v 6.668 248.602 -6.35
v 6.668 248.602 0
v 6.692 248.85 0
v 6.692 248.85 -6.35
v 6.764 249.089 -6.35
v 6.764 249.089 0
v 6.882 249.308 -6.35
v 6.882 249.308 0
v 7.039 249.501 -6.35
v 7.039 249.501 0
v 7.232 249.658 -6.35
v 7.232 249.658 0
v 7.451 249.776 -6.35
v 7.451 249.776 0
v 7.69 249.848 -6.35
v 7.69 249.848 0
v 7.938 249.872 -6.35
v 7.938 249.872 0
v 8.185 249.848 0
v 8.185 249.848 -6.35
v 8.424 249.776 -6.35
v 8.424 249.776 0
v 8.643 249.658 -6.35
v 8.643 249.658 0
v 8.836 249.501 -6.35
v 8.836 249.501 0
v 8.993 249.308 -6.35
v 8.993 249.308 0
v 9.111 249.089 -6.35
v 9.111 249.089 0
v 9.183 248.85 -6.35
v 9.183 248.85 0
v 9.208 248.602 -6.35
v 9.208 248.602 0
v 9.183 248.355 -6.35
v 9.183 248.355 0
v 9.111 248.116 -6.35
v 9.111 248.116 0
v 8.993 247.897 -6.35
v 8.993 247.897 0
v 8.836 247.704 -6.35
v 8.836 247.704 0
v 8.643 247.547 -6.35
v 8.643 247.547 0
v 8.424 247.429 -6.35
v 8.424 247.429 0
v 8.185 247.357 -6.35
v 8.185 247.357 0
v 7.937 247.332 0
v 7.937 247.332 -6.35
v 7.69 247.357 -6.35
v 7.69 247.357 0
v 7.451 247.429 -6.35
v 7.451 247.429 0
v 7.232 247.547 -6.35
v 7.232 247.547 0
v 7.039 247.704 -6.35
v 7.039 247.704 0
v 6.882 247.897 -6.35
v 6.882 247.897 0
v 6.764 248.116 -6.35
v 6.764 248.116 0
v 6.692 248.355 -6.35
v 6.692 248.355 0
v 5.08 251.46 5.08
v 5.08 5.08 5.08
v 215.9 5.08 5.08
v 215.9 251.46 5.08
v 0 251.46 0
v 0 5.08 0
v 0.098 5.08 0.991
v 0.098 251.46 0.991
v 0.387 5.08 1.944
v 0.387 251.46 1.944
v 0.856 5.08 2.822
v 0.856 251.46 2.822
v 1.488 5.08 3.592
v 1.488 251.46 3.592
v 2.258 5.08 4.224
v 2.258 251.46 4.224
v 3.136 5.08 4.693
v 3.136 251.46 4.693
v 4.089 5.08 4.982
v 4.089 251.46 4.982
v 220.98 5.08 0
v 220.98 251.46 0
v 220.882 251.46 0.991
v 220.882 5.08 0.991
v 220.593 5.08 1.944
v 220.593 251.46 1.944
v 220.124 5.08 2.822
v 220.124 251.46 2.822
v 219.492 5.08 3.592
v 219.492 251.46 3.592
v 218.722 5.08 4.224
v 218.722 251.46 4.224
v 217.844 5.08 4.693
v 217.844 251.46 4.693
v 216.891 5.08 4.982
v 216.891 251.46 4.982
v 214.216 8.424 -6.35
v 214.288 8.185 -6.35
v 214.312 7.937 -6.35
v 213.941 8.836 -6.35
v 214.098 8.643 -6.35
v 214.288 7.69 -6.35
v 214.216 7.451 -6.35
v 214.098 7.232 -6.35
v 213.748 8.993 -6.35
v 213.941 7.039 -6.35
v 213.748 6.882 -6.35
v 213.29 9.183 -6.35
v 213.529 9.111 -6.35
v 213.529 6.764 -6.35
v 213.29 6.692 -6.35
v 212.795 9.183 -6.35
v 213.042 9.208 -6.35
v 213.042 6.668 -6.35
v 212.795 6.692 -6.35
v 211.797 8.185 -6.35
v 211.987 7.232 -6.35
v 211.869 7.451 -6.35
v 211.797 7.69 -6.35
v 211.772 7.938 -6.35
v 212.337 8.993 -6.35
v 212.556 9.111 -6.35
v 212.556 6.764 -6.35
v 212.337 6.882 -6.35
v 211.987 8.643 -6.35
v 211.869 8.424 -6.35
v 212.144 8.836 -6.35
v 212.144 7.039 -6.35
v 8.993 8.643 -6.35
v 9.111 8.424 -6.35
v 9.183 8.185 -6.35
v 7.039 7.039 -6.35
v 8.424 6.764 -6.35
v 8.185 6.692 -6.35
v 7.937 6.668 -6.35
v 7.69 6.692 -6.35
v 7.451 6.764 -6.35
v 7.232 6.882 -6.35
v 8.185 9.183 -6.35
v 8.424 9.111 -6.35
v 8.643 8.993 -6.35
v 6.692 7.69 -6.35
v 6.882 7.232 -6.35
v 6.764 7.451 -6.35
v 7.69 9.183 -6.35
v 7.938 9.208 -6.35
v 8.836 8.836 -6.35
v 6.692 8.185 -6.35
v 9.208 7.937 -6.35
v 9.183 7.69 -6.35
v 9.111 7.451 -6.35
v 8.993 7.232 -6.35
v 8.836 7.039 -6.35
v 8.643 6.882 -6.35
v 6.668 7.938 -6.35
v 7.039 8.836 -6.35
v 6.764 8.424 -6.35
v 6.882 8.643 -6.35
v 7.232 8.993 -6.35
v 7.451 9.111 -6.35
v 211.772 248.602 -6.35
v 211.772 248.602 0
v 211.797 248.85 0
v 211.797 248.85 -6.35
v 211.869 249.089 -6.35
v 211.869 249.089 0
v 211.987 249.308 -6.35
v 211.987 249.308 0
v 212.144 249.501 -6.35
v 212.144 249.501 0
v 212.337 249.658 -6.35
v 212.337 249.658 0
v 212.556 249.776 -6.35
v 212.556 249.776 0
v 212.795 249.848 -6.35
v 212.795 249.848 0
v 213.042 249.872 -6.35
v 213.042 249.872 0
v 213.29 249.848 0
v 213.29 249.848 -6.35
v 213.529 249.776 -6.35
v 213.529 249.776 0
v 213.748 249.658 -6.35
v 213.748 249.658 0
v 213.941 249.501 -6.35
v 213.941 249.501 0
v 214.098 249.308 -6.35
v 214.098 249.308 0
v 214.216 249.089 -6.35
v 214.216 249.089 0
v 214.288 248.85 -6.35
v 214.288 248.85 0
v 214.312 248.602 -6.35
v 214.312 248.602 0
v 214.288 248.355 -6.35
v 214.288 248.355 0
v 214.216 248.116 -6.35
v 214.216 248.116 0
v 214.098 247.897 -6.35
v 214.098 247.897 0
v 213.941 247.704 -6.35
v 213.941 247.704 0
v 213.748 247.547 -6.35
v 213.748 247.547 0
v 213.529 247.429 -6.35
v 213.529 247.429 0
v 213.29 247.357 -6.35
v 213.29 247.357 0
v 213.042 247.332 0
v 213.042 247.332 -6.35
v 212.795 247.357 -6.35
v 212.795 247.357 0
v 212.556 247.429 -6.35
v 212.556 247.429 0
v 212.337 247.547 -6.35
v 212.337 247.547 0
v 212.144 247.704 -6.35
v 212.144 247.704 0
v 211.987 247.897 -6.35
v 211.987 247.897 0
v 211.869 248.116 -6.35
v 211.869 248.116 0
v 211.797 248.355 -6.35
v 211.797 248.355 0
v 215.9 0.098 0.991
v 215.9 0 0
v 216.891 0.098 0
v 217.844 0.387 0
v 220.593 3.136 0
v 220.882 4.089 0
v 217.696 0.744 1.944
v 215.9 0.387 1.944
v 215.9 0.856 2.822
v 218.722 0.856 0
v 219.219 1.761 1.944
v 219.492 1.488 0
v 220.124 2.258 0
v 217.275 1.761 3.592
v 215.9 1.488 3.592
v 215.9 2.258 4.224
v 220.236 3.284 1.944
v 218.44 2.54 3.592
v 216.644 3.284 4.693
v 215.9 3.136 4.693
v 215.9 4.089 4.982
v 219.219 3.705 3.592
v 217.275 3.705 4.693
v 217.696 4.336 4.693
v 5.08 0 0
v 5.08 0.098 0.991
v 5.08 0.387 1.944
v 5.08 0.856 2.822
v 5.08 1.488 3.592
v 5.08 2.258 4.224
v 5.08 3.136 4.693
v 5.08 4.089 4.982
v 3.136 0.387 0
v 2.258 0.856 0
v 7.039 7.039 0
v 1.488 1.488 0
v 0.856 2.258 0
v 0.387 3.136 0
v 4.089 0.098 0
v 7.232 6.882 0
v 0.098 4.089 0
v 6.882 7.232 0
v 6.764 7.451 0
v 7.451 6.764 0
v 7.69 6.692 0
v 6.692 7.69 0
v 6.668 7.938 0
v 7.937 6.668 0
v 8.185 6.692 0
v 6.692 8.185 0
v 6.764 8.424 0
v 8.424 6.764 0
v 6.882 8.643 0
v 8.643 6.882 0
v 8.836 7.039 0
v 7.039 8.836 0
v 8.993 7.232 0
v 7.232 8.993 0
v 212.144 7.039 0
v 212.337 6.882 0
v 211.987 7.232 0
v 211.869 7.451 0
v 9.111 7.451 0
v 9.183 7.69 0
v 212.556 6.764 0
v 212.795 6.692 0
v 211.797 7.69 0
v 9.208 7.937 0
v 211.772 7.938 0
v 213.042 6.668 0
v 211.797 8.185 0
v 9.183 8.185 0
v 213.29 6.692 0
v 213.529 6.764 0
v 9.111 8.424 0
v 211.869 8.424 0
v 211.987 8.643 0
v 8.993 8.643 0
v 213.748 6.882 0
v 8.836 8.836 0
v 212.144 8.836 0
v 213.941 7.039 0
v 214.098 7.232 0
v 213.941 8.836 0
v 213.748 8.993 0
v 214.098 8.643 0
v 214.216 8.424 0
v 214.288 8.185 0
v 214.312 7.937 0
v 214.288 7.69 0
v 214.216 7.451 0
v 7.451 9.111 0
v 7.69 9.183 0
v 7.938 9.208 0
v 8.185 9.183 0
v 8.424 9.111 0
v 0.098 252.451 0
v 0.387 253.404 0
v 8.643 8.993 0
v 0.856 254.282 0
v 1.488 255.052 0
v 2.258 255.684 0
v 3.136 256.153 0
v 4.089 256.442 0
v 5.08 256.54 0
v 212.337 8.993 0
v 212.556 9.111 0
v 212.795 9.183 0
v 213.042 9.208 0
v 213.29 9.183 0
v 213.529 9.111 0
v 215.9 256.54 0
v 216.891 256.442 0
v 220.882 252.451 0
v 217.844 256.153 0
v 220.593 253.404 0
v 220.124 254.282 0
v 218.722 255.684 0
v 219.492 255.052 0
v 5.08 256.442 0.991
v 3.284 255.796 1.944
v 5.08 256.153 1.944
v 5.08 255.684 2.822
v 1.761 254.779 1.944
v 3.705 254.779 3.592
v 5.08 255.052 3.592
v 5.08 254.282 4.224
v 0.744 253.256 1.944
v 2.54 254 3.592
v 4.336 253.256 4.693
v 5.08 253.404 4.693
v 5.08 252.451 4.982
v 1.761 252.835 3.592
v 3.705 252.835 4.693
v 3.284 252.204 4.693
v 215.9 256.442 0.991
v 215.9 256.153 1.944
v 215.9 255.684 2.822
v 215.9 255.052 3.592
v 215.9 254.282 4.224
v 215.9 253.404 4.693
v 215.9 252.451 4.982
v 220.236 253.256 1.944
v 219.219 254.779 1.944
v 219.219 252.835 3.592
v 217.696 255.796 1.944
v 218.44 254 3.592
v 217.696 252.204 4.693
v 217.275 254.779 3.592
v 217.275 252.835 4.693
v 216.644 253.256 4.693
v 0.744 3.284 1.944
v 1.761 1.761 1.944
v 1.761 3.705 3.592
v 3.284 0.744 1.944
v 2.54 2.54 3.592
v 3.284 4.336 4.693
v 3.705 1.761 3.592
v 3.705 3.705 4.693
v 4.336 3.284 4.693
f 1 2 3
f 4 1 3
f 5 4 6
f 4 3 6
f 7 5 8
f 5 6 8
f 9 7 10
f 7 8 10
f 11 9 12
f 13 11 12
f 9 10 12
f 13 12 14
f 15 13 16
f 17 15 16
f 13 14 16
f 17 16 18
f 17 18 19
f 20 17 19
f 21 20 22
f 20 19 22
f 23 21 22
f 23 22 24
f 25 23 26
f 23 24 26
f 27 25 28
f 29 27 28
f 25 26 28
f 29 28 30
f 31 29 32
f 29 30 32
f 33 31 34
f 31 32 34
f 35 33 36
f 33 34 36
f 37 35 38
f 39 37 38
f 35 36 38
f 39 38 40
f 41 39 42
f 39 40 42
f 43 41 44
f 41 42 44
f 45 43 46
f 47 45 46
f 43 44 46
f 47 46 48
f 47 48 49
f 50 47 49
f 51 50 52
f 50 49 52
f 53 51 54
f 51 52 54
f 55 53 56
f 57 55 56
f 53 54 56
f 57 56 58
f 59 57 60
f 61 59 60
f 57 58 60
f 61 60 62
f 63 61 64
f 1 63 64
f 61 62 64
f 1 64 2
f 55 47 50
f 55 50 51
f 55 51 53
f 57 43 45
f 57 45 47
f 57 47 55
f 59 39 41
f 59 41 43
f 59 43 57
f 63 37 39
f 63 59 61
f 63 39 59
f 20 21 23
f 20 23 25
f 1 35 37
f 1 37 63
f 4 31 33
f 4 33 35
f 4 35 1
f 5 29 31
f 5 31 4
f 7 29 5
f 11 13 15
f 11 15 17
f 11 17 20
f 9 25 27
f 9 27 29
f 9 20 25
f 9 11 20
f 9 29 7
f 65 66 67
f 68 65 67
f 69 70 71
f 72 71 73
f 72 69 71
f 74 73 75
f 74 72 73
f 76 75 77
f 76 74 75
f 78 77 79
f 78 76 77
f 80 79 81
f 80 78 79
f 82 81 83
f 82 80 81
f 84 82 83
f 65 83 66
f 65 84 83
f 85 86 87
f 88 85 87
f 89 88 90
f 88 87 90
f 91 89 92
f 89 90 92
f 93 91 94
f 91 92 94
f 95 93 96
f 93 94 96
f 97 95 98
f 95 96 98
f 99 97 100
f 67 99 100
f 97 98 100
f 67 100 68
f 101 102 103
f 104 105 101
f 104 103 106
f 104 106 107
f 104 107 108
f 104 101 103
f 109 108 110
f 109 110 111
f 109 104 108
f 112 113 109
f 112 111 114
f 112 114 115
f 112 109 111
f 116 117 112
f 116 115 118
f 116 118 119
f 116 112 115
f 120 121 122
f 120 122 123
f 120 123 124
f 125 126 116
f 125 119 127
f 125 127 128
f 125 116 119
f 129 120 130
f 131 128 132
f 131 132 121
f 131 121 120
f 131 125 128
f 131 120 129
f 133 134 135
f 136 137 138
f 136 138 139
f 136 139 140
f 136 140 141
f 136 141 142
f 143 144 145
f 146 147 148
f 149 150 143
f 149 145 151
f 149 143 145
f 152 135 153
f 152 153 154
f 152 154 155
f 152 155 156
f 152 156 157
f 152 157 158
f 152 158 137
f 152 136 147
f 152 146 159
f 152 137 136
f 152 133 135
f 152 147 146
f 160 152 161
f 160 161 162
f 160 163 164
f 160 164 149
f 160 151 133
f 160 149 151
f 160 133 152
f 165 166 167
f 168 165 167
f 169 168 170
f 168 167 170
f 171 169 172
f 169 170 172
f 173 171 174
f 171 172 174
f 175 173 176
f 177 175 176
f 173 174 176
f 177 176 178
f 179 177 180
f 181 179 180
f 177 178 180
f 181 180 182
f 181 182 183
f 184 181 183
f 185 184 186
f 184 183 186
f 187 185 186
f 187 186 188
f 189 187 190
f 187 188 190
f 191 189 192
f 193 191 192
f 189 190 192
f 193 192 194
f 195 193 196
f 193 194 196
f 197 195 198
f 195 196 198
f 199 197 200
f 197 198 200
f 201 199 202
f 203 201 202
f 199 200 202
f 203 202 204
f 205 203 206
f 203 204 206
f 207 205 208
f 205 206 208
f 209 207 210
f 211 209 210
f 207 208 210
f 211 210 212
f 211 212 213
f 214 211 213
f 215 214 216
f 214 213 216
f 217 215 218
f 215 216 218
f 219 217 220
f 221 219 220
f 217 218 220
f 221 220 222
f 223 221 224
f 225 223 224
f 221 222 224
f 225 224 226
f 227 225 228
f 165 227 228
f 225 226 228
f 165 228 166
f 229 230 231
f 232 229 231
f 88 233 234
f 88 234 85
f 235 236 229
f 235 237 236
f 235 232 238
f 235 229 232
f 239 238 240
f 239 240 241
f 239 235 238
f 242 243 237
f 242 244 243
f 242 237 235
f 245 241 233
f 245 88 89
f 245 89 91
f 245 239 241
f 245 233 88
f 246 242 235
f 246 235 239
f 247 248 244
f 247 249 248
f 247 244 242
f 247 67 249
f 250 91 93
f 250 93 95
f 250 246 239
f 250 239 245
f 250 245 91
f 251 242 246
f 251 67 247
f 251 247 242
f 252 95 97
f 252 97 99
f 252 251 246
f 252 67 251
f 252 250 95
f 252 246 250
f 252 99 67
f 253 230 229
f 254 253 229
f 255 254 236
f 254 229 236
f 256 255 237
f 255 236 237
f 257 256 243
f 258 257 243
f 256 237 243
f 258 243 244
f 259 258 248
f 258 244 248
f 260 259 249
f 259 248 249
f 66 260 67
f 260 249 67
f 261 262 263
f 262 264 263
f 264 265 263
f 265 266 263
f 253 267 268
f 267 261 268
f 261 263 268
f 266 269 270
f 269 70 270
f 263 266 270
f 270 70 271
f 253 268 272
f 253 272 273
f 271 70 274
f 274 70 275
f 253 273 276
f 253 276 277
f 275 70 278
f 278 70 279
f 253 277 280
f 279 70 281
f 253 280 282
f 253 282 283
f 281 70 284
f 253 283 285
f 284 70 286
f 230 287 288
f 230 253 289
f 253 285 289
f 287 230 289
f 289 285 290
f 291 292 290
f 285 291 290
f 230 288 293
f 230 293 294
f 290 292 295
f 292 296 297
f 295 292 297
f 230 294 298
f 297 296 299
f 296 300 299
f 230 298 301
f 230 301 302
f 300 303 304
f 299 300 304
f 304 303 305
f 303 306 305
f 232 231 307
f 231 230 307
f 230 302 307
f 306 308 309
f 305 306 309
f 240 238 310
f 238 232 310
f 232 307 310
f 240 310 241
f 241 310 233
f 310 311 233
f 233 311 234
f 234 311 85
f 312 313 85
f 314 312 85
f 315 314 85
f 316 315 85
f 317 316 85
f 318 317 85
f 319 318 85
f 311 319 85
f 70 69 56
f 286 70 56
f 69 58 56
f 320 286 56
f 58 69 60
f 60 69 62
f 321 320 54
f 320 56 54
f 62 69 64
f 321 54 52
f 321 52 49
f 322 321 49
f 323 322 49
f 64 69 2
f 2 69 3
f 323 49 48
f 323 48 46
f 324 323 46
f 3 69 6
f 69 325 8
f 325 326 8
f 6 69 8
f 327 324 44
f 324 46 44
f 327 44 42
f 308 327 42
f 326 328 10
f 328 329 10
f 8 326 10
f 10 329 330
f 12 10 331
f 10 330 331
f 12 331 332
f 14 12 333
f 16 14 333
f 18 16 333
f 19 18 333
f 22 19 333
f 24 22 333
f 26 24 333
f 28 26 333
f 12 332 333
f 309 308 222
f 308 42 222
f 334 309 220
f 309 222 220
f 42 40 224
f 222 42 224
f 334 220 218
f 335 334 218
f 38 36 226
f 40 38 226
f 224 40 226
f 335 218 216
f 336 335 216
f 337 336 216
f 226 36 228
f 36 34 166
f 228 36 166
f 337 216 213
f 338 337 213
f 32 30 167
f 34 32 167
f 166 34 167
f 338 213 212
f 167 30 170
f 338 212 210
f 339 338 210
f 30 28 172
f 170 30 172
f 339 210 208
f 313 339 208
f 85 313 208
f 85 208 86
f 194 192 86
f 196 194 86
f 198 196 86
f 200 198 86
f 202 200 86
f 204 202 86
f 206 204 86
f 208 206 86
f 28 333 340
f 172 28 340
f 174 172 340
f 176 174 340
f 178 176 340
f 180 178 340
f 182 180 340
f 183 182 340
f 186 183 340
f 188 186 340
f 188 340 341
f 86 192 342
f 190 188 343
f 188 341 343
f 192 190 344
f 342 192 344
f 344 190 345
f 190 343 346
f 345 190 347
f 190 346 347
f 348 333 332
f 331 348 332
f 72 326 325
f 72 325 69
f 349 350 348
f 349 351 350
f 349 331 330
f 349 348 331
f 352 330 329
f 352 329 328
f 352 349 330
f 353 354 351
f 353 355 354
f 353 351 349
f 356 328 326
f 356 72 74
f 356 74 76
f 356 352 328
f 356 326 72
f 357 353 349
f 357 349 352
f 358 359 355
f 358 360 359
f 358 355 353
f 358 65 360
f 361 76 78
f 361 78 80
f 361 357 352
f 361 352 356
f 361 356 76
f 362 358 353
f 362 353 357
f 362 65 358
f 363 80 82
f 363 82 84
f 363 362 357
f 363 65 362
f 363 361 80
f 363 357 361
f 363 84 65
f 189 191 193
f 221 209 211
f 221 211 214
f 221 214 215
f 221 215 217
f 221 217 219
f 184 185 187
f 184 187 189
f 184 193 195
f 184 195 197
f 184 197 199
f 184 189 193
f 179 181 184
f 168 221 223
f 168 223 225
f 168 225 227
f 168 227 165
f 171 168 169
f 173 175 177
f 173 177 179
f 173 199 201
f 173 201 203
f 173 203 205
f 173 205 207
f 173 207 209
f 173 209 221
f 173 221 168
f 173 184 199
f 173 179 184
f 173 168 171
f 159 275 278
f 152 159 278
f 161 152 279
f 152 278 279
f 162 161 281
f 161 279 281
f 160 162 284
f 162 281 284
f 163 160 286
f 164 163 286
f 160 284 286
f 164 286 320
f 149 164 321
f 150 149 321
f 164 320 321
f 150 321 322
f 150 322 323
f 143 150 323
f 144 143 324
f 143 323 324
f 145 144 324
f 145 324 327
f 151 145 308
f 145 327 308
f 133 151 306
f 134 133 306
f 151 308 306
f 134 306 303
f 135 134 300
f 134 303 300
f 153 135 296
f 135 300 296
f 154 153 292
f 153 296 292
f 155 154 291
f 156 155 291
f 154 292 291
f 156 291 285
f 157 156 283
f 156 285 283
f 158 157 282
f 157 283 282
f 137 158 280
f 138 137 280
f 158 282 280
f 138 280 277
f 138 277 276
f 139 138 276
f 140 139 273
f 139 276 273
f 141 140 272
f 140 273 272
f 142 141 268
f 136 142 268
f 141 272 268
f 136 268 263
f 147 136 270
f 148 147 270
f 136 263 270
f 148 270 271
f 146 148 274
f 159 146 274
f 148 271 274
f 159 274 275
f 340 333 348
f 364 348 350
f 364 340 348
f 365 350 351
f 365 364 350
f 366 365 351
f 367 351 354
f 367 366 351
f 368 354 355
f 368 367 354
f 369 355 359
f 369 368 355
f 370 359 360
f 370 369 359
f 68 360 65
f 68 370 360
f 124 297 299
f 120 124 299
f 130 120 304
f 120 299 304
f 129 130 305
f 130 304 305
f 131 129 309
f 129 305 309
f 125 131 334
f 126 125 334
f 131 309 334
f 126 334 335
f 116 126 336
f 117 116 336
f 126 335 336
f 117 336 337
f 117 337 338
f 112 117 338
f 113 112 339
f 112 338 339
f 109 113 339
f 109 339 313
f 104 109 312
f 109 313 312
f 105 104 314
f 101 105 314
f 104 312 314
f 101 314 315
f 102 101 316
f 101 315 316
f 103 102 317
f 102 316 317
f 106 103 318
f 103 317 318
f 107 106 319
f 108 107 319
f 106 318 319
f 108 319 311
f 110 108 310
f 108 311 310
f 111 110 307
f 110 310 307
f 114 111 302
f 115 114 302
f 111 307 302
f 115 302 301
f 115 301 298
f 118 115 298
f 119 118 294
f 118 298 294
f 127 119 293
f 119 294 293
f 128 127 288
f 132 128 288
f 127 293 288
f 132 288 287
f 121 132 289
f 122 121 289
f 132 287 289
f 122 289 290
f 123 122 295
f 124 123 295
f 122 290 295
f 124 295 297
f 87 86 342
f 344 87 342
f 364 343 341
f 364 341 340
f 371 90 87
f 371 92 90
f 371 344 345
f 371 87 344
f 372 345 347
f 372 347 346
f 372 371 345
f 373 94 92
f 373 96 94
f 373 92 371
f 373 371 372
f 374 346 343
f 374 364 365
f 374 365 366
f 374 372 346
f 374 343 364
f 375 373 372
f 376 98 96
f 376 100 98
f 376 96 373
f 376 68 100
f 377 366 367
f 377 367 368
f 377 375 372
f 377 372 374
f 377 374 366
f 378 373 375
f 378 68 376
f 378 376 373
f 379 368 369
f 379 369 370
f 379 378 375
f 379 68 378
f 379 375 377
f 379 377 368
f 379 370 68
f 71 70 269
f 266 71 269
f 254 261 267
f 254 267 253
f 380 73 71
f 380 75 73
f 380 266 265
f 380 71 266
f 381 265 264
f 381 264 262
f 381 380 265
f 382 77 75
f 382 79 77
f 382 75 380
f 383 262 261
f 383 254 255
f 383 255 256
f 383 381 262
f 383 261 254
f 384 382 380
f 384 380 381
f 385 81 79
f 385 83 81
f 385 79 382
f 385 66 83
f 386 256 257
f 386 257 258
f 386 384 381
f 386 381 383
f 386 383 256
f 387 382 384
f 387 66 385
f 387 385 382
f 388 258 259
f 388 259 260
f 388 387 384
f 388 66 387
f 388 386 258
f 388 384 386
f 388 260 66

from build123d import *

# Parameters (mm, degrees)
SKETCH1_W           = 220.98
SKETCH1_H           = 256.54
BOSS_EXTRUDE1_DEPTH = 5.08
FILLET1_R           = 5.08
FILLET2_R           = 5.08
SKETCH2_R           = 1.27
BOSS_EXTRUDE2_DEPTH = 6.35


# Some blends are built 0.0001 mm under size
with BuildPart() as part:
    # Sketch1 → Boss-Extrude1 (new body)
    with BuildSketch(Plane.XY):
        with Locations((110.49, 128.27)):
            Rectangle(SKETCH1_W, SKETCH1_H)
    extrude(amount=BOSS_EXTRUDE1_DEPTH)

    # Fillet1
    fillet1_edges = [part.edges().sort_by_distance(p)[0] for p in [
        (110.49, 0, 5.08),
        (220.98, 128.27, 5.08),
        (0, 128.27, 5.08),
        (110.49, 256.54, 5.08),
    ]]
    fillet(fillet1_edges, radius=FILLET1_R - 0.0001)  # a hair under: the kernel refuses the full size

    # Fillet2
    # the kernel refuses this fillet: 5.08 mm, written as the material it takes off along each edge
    with BuildSketch(Plane(origin=(5.08, 251.46, 5.08), x_dir=(0, 1, 0), z_dir=(1, 0, 0))) as fillet2_piece_1:
        with BuildLine():
            CenterArc((0.0001, -5.0799), 5.0799, 0, 90)
            Line((5.08, -5.0799), (5.08, 0))
            Line((5.08, 0), (0.0001, 0))
        make_face()
    revolve(axis=Axis((5.08, 251.46, 5.08), (0, 0, 1)), revolution_arc=90, mode=Mode.SUBTRACT)
    with BuildSketch(Plane(origin=(215.9, 251.46, 5.08), x_dir=(1, 0, 0), z_dir=(0, -1, 0))) as fillet2_piece_2:
        with BuildLine():
            CenterArc((0.0001, -5.0799), 5.0799, 0, 90)
            Line((5.08, -5.0799), (5.08, 0))
            Line((5.08, 0), (0.0001, 0))
        make_face()
    revolve(axis=Axis((215.9, 251.46, 5.08), (0, 0, 1)), revolution_arc=90, mode=Mode.SUBTRACT)
    with BuildSketch(Plane(origin=(5.08, 5.08, 5.08), x_dir=(-1, 0, 0), z_dir=(0, 1, 0))) as fillet2_piece_3:
        with BuildLine():
            CenterArc((0.0001, -5.0799), 5.0799, 0, 90)
            Line((5.08, -5.0799), (5.08, 0))
            Line((5.08, 0), (0.0001, 0))
        make_face()
    revolve(axis=Axis((5.08, 5.08, 5.08), (0, 0, 1)), revolution_arc=90, mode=Mode.SUBTRACT)
    with BuildSketch(Plane(origin=(215.9, 5.08, 5.08), x_dir=(0, -1, 0), z_dir=(-1, 0, 0))) as fillet2_piece_4:
        with BuildLine():
            CenterArc((0.0001, -5.0799), 5.0799, 0, 90)
            Line((5.08, -5.0799), (5.08, 0))
            Line((5.08, 0), (0.0001, 0))
        make_face()
    revolve(axis=Axis((215.9, 5.08, 5.08), (0, 0, 1)), revolution_arc=90, mode=Mode.SUBTRACT)
    with BuildSketch(Plane(origin=(220.98, 0, -12.7), x_dir=(-1, 0, 0), z_dir=(0, 0, 1)), Plane(origin=(220.98, 256.54, -12.7), x_dir=(0, -1, 0), z_dir=(0, 0, 1))) as fillet2_piece_5:
        with BuildLine():
            CenterArc((FILLET2_R, -FILLET2_R), FILLET2_R, 90, 90)
            Line((0, -FILLET2_R), (0, 0))
            Line((0, 0), (FILLET2_R, 0))
        make_face()
    extrude(amount=17.78, mode=Mode.SUBTRACT)
    with BuildSketch(Plane(origin=(0, 0, -12.7), x_dir=(1, 0, 0), z_dir=(0, 0, 1)), Plane(origin=(0, 256.54, -12.7), x_dir=(0, -1, 0), z_dir=(0, 0, 1))) as fillet2_piece_6:
        with BuildLine():
            CenterArc((FILLET2_R, FILLET2_R), FILLET2_R, 180, 90)
            Line((0, FILLET2_R), (0, 0))
            Line((0, 0), (FILLET2_R, 0))
        make_face()
    extrude(amount=17.78, mode=Mode.SUBTRACT)

    # Sketch2 → Boss-Extrude2 (add)
    with BuildSketch(Plane(origin=(0, 0, 0), x_dir=(-1, 0, 0), z_dir=(0, 0, -1))):
        with Locations((-213.0425, 248.6025)):
            Circle(SKETCH2_R)
        with Locations((-7.9375, 248.6025)):
            Circle(SKETCH2_R)
        with Locations((-213.0425, 7.9375)):
            Circle(SKETCH2_R)
        with Locations((-7.9375, 7.9375)):
            Circle(SKETCH2_R)
    extrude(amount=BOSS_EXTRUDE2_DEPTH)


solid = part.part
